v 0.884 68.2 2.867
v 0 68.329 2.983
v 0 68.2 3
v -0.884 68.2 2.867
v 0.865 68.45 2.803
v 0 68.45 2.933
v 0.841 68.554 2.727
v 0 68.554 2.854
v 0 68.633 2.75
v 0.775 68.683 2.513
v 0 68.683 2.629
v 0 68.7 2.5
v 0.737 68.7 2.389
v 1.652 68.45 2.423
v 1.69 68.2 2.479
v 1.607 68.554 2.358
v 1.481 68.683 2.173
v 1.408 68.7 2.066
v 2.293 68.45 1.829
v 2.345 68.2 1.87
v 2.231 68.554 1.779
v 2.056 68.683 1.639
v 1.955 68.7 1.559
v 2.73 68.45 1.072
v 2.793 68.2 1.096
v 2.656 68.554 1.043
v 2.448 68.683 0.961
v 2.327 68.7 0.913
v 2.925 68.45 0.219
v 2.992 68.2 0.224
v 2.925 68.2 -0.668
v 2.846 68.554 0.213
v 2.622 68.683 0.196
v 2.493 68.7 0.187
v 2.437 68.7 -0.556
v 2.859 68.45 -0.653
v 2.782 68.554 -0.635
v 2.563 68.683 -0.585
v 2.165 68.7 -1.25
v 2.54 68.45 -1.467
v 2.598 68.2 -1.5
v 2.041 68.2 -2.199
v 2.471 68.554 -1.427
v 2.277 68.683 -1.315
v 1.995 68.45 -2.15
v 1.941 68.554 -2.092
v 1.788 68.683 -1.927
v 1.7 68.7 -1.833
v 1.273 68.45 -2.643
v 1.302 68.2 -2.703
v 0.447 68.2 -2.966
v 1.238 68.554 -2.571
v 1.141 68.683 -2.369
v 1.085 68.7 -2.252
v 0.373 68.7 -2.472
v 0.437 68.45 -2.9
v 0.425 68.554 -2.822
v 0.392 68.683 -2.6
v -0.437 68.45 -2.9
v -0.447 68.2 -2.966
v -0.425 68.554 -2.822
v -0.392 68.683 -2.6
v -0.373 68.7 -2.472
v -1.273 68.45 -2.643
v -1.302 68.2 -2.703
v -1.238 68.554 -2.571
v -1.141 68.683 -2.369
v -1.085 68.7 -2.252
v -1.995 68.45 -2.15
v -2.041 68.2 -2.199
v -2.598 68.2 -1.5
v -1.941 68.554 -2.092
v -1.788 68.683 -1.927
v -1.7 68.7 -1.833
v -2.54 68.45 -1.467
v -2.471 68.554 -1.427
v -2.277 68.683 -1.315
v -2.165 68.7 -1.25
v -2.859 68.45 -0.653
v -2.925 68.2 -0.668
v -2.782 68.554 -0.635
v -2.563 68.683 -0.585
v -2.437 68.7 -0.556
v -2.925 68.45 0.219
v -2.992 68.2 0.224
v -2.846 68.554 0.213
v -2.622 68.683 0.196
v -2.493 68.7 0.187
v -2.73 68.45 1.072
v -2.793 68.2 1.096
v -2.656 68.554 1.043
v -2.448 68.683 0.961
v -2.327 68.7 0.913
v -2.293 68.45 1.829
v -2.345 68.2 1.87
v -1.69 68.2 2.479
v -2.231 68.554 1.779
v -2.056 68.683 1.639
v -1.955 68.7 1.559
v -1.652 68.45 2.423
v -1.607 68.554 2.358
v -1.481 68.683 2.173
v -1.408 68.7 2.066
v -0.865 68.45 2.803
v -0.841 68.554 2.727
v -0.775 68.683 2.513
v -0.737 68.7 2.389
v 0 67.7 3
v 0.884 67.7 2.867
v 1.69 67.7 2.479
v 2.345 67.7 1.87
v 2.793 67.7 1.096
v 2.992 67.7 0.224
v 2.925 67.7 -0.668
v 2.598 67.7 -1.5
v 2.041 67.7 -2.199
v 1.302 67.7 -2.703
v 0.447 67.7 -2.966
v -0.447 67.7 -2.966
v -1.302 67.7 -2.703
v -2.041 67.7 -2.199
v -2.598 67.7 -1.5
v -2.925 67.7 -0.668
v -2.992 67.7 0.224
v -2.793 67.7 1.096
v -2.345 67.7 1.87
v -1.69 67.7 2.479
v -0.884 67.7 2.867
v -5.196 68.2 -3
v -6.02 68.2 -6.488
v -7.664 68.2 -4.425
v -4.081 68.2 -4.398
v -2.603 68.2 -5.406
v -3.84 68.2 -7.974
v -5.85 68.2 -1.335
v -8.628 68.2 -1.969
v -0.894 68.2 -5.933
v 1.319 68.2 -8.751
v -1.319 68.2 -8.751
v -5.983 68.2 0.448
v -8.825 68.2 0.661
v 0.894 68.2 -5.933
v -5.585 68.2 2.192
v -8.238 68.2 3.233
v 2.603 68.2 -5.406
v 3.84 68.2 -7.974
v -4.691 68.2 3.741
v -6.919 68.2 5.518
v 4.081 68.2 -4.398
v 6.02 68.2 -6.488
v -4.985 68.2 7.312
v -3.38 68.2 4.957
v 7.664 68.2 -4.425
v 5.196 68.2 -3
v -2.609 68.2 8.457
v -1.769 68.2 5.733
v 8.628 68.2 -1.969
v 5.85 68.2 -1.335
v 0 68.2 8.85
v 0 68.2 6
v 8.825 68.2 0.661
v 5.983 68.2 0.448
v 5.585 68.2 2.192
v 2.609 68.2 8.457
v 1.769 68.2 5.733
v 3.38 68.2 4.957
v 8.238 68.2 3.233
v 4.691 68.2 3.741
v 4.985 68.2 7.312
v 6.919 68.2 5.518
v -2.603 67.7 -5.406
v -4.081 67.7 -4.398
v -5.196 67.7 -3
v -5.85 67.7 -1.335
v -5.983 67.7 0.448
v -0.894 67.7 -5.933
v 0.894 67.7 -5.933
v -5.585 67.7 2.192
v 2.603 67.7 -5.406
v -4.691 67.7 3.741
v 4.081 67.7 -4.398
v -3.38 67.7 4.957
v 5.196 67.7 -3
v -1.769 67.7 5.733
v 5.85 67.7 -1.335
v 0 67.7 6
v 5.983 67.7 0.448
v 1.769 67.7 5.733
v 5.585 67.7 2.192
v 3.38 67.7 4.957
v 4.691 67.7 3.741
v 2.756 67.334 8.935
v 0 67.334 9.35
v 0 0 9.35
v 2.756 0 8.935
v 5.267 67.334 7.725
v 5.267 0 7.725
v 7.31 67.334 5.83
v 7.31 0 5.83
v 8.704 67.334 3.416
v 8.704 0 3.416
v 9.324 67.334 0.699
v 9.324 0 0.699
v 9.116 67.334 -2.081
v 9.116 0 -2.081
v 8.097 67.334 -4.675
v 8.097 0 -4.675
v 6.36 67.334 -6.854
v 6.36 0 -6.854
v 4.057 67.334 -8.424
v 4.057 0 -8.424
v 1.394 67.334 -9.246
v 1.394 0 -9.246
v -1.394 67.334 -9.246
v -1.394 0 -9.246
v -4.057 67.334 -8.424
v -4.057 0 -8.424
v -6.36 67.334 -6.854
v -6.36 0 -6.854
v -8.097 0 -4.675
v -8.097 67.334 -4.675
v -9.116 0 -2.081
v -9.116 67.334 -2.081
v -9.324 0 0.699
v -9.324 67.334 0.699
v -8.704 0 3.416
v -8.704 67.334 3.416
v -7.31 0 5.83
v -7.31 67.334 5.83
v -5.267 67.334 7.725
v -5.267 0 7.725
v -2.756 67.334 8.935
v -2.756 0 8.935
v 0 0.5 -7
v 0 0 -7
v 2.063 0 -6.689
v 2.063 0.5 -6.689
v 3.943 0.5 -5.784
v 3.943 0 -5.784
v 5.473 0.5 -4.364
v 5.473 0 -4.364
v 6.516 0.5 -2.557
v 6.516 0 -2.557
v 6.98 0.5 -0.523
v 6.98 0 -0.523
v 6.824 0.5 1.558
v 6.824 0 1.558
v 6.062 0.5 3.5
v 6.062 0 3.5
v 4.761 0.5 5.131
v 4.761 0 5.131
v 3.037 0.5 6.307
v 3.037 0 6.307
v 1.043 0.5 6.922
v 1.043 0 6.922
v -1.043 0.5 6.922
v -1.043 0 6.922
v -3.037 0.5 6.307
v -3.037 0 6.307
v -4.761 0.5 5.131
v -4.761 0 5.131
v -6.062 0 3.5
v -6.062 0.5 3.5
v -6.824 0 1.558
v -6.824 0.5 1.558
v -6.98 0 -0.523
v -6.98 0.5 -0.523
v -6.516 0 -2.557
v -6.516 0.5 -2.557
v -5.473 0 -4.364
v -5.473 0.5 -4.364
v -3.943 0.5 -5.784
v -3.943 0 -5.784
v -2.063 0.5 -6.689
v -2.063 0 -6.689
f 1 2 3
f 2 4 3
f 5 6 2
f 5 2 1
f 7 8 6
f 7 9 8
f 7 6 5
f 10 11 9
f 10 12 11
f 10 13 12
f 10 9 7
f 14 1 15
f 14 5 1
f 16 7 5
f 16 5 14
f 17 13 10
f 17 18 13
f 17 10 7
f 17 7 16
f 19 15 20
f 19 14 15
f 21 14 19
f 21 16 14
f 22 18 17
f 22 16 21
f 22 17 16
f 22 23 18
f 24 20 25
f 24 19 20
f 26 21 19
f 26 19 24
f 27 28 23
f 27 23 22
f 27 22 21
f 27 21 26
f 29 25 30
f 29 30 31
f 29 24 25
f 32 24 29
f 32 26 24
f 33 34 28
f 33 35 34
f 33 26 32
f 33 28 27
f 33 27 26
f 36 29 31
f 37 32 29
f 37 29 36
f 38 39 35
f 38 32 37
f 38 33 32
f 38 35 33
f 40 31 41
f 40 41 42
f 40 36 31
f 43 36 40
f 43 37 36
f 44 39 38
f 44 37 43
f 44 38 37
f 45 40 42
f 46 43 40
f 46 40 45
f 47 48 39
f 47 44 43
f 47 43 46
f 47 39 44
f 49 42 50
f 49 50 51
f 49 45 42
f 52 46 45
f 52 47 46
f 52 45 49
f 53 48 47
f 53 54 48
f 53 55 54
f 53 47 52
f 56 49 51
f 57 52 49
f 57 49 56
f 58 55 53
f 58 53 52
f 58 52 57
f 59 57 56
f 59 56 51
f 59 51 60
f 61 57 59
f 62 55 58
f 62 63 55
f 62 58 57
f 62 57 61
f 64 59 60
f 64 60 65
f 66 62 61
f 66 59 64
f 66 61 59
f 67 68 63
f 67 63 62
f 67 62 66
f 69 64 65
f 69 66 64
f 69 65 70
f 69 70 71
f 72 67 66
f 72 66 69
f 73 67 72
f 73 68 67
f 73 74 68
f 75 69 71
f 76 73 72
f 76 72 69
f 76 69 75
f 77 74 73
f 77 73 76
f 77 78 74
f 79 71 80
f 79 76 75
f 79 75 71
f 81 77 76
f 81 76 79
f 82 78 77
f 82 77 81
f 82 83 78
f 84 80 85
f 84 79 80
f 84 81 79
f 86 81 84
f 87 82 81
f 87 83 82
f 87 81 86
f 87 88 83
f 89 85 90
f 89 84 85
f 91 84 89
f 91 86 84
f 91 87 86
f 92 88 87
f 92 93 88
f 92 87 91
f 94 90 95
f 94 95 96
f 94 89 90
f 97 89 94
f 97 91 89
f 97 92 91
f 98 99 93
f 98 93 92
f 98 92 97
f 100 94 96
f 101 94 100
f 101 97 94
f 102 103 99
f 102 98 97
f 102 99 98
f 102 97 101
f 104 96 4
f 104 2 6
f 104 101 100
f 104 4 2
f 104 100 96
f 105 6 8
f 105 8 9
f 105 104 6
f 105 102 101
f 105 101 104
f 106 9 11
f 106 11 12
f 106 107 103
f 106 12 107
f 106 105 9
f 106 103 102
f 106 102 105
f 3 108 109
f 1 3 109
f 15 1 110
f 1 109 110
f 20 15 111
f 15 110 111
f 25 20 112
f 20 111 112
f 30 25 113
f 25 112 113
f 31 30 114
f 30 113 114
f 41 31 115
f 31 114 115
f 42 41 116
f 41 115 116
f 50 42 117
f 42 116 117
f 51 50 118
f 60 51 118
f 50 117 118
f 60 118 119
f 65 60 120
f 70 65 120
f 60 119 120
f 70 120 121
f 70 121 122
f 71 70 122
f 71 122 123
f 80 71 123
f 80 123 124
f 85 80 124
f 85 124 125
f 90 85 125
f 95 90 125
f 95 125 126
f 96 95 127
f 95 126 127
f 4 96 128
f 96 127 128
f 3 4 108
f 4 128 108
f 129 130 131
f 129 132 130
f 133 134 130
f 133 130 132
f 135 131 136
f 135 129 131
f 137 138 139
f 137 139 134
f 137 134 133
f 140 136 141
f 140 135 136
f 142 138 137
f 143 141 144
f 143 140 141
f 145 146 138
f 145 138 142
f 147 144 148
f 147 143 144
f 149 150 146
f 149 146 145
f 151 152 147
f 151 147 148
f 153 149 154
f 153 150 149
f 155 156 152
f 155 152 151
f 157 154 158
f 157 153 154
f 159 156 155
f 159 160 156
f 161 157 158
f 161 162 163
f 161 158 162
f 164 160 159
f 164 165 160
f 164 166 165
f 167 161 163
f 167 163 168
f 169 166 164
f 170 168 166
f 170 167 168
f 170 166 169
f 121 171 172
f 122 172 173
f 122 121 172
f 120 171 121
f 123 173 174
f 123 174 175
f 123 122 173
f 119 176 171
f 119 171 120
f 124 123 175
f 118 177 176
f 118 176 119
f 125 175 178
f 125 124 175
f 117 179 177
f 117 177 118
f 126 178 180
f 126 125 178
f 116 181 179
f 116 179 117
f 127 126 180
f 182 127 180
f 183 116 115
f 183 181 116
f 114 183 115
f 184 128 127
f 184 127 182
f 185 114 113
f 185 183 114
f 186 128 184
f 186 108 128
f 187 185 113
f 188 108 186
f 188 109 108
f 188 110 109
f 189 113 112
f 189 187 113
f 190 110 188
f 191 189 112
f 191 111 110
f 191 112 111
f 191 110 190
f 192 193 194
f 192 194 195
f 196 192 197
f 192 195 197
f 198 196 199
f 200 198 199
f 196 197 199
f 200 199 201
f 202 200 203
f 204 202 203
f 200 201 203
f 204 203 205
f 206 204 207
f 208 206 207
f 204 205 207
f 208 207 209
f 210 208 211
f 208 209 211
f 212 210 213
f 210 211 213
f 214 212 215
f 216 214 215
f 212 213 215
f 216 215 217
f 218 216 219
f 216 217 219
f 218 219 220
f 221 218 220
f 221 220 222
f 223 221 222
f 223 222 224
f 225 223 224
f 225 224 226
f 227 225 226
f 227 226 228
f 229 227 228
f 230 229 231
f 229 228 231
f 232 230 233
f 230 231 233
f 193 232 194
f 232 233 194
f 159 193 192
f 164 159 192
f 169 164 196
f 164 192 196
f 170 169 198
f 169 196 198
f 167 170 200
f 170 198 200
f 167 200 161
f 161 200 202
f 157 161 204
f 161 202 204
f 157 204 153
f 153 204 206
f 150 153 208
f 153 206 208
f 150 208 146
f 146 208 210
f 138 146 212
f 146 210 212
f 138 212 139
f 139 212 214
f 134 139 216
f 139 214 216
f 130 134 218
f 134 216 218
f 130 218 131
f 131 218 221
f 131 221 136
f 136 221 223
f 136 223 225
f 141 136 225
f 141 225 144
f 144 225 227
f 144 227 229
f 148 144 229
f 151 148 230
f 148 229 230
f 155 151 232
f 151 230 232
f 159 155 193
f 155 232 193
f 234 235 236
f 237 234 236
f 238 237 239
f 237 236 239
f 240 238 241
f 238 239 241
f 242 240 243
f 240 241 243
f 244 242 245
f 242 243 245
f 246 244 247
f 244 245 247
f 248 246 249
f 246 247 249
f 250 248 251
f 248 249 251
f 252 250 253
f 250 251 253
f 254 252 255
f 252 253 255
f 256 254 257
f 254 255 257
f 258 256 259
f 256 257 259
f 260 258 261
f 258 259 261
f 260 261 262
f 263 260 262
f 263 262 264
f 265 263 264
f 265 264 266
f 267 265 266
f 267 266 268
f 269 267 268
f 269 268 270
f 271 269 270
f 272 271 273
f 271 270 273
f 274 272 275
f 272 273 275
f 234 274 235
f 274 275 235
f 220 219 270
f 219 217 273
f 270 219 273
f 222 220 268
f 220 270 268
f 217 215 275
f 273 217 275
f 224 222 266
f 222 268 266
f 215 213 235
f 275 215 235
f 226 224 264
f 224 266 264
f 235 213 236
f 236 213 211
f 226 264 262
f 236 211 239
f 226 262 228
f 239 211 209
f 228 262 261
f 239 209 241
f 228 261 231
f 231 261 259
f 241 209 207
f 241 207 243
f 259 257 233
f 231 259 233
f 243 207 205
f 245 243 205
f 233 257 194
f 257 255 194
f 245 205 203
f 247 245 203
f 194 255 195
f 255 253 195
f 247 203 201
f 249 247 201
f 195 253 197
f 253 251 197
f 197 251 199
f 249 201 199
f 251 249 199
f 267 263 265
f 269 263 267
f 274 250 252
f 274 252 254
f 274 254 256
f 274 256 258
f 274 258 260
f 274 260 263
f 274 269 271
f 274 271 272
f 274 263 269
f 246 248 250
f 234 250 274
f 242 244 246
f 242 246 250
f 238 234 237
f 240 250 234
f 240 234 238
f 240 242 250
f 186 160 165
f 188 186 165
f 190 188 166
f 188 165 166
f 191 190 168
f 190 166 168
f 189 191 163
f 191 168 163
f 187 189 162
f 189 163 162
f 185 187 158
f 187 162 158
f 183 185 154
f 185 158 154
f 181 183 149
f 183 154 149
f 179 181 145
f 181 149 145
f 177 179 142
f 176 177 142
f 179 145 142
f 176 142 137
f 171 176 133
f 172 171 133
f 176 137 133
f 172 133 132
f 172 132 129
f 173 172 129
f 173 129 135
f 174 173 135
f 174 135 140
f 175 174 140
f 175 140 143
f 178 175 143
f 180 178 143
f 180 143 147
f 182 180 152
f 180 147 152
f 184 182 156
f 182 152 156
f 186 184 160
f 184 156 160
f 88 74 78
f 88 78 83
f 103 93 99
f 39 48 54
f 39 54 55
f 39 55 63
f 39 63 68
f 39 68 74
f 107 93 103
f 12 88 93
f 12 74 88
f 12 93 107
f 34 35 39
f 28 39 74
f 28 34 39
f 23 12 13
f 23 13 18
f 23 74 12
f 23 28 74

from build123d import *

# Parameters (mm, degrees)
SZKIC1_R                    = 9.35
DODANIE_WYCI_GNI_CIE1_DEPTH = 68.2
SZKIC2_R                    = 7
WYTNIJ_WYCI_GNI_CIE1_DEPTH  = 0.5
SZKIC3_R                    = 6
WYTNIJ_WYCI_GNI_CIE2_DEPTH  = 0.5
SZKIC4_R                    = 3
DODANIE_WYCI_GNI_CIE2_DEPTH = 1
ZAOKR_GLENIE1_R             = 0.5
SFAZOWANIE1_SIZE            = 0.5
SFAZOWANIE1_SIZE2           = 0.866025404


with BuildPart() as part:
    # Szkic1 → Dodanie-wyciągnięcie1 (new body)
    with BuildSketch(Plane(origin=(0, 0, 0), x_dir=(1, 0, 0), z_dir=(0, 1, 0))):
        with Locations(Location((0, 0, 0), (0, 0, 270))):
            Circle(SZKIC1_R)
    extrude(amount=DODANIE_WYCI_GNI_CIE1_DEPTH)

    # Szkic2 → Wytnij-wyciągnięcie1 (cut)
    with BuildSketch(Plane.XZ):
        with Locations(Location((0, 0, 0), (0, 0, 270))):
            Circle(SZKIC2_R)
    extrude(amount=-WYTNIJ_WYCI_GNI_CIE1_DEPTH, mode=Mode.SUBTRACT)

    # Szkic3 → Wytnij-wyciągnięcie2 (cut)
    with BuildSketch(Plane(origin=(0, 68.2, 0), x_dir=(1, 0, 0), z_dir=(0, 1, 0))):
        with Locations(Location((0, 0, 0), (0, 0, 270))):
            Circle(SZKIC3_R)
    extrude(amount=-WYTNIJ_WYCI_GNI_CIE2_DEPTH, mode=Mode.SUBTRACT)

    # Szkic4 → Dodanie-wyciągnięcie2 (add)
    with BuildSketch(Plane(origin=(0, 67.7, 0), x_dir=(1, 0, 0), z_dir=(0, 1, 0))):
        with Locations(Location((0, 0, 0), (0, 0, 270))):
            Circle(SZKIC4_R)
    extrude(amount=DODANIE_WYCI_GNI_CIE2_DEPTH)

    # Zaokrąglenie1
    zaokr_glenie1_edges = [part.edges().sort_by_distance(p)[0] for p in [
        (0, 68.7, -3),
    ]]
    fillet(zaokr_glenie1_edges, radius=ZAOKR_GLENIE1_R)

    # Sfazowanie1
    sfazowanie1_edges = [part.edges().sort_by_distance(p)[0] for p in [
        (0, 68.2, -9.35),
    ]]
    sfazowanie1_side = [part.faces().sort_by_distance(p)[0] for p in [
        (0, 68.2, -9.085542064),
    ]]
    chamfer(sfazowanie1_edges, length=SFAZOWANIE1_SIZE, length2=SFAZOWANIE1_SIZE2, reference=sfazowanie1_side[0])


solid = part.part
